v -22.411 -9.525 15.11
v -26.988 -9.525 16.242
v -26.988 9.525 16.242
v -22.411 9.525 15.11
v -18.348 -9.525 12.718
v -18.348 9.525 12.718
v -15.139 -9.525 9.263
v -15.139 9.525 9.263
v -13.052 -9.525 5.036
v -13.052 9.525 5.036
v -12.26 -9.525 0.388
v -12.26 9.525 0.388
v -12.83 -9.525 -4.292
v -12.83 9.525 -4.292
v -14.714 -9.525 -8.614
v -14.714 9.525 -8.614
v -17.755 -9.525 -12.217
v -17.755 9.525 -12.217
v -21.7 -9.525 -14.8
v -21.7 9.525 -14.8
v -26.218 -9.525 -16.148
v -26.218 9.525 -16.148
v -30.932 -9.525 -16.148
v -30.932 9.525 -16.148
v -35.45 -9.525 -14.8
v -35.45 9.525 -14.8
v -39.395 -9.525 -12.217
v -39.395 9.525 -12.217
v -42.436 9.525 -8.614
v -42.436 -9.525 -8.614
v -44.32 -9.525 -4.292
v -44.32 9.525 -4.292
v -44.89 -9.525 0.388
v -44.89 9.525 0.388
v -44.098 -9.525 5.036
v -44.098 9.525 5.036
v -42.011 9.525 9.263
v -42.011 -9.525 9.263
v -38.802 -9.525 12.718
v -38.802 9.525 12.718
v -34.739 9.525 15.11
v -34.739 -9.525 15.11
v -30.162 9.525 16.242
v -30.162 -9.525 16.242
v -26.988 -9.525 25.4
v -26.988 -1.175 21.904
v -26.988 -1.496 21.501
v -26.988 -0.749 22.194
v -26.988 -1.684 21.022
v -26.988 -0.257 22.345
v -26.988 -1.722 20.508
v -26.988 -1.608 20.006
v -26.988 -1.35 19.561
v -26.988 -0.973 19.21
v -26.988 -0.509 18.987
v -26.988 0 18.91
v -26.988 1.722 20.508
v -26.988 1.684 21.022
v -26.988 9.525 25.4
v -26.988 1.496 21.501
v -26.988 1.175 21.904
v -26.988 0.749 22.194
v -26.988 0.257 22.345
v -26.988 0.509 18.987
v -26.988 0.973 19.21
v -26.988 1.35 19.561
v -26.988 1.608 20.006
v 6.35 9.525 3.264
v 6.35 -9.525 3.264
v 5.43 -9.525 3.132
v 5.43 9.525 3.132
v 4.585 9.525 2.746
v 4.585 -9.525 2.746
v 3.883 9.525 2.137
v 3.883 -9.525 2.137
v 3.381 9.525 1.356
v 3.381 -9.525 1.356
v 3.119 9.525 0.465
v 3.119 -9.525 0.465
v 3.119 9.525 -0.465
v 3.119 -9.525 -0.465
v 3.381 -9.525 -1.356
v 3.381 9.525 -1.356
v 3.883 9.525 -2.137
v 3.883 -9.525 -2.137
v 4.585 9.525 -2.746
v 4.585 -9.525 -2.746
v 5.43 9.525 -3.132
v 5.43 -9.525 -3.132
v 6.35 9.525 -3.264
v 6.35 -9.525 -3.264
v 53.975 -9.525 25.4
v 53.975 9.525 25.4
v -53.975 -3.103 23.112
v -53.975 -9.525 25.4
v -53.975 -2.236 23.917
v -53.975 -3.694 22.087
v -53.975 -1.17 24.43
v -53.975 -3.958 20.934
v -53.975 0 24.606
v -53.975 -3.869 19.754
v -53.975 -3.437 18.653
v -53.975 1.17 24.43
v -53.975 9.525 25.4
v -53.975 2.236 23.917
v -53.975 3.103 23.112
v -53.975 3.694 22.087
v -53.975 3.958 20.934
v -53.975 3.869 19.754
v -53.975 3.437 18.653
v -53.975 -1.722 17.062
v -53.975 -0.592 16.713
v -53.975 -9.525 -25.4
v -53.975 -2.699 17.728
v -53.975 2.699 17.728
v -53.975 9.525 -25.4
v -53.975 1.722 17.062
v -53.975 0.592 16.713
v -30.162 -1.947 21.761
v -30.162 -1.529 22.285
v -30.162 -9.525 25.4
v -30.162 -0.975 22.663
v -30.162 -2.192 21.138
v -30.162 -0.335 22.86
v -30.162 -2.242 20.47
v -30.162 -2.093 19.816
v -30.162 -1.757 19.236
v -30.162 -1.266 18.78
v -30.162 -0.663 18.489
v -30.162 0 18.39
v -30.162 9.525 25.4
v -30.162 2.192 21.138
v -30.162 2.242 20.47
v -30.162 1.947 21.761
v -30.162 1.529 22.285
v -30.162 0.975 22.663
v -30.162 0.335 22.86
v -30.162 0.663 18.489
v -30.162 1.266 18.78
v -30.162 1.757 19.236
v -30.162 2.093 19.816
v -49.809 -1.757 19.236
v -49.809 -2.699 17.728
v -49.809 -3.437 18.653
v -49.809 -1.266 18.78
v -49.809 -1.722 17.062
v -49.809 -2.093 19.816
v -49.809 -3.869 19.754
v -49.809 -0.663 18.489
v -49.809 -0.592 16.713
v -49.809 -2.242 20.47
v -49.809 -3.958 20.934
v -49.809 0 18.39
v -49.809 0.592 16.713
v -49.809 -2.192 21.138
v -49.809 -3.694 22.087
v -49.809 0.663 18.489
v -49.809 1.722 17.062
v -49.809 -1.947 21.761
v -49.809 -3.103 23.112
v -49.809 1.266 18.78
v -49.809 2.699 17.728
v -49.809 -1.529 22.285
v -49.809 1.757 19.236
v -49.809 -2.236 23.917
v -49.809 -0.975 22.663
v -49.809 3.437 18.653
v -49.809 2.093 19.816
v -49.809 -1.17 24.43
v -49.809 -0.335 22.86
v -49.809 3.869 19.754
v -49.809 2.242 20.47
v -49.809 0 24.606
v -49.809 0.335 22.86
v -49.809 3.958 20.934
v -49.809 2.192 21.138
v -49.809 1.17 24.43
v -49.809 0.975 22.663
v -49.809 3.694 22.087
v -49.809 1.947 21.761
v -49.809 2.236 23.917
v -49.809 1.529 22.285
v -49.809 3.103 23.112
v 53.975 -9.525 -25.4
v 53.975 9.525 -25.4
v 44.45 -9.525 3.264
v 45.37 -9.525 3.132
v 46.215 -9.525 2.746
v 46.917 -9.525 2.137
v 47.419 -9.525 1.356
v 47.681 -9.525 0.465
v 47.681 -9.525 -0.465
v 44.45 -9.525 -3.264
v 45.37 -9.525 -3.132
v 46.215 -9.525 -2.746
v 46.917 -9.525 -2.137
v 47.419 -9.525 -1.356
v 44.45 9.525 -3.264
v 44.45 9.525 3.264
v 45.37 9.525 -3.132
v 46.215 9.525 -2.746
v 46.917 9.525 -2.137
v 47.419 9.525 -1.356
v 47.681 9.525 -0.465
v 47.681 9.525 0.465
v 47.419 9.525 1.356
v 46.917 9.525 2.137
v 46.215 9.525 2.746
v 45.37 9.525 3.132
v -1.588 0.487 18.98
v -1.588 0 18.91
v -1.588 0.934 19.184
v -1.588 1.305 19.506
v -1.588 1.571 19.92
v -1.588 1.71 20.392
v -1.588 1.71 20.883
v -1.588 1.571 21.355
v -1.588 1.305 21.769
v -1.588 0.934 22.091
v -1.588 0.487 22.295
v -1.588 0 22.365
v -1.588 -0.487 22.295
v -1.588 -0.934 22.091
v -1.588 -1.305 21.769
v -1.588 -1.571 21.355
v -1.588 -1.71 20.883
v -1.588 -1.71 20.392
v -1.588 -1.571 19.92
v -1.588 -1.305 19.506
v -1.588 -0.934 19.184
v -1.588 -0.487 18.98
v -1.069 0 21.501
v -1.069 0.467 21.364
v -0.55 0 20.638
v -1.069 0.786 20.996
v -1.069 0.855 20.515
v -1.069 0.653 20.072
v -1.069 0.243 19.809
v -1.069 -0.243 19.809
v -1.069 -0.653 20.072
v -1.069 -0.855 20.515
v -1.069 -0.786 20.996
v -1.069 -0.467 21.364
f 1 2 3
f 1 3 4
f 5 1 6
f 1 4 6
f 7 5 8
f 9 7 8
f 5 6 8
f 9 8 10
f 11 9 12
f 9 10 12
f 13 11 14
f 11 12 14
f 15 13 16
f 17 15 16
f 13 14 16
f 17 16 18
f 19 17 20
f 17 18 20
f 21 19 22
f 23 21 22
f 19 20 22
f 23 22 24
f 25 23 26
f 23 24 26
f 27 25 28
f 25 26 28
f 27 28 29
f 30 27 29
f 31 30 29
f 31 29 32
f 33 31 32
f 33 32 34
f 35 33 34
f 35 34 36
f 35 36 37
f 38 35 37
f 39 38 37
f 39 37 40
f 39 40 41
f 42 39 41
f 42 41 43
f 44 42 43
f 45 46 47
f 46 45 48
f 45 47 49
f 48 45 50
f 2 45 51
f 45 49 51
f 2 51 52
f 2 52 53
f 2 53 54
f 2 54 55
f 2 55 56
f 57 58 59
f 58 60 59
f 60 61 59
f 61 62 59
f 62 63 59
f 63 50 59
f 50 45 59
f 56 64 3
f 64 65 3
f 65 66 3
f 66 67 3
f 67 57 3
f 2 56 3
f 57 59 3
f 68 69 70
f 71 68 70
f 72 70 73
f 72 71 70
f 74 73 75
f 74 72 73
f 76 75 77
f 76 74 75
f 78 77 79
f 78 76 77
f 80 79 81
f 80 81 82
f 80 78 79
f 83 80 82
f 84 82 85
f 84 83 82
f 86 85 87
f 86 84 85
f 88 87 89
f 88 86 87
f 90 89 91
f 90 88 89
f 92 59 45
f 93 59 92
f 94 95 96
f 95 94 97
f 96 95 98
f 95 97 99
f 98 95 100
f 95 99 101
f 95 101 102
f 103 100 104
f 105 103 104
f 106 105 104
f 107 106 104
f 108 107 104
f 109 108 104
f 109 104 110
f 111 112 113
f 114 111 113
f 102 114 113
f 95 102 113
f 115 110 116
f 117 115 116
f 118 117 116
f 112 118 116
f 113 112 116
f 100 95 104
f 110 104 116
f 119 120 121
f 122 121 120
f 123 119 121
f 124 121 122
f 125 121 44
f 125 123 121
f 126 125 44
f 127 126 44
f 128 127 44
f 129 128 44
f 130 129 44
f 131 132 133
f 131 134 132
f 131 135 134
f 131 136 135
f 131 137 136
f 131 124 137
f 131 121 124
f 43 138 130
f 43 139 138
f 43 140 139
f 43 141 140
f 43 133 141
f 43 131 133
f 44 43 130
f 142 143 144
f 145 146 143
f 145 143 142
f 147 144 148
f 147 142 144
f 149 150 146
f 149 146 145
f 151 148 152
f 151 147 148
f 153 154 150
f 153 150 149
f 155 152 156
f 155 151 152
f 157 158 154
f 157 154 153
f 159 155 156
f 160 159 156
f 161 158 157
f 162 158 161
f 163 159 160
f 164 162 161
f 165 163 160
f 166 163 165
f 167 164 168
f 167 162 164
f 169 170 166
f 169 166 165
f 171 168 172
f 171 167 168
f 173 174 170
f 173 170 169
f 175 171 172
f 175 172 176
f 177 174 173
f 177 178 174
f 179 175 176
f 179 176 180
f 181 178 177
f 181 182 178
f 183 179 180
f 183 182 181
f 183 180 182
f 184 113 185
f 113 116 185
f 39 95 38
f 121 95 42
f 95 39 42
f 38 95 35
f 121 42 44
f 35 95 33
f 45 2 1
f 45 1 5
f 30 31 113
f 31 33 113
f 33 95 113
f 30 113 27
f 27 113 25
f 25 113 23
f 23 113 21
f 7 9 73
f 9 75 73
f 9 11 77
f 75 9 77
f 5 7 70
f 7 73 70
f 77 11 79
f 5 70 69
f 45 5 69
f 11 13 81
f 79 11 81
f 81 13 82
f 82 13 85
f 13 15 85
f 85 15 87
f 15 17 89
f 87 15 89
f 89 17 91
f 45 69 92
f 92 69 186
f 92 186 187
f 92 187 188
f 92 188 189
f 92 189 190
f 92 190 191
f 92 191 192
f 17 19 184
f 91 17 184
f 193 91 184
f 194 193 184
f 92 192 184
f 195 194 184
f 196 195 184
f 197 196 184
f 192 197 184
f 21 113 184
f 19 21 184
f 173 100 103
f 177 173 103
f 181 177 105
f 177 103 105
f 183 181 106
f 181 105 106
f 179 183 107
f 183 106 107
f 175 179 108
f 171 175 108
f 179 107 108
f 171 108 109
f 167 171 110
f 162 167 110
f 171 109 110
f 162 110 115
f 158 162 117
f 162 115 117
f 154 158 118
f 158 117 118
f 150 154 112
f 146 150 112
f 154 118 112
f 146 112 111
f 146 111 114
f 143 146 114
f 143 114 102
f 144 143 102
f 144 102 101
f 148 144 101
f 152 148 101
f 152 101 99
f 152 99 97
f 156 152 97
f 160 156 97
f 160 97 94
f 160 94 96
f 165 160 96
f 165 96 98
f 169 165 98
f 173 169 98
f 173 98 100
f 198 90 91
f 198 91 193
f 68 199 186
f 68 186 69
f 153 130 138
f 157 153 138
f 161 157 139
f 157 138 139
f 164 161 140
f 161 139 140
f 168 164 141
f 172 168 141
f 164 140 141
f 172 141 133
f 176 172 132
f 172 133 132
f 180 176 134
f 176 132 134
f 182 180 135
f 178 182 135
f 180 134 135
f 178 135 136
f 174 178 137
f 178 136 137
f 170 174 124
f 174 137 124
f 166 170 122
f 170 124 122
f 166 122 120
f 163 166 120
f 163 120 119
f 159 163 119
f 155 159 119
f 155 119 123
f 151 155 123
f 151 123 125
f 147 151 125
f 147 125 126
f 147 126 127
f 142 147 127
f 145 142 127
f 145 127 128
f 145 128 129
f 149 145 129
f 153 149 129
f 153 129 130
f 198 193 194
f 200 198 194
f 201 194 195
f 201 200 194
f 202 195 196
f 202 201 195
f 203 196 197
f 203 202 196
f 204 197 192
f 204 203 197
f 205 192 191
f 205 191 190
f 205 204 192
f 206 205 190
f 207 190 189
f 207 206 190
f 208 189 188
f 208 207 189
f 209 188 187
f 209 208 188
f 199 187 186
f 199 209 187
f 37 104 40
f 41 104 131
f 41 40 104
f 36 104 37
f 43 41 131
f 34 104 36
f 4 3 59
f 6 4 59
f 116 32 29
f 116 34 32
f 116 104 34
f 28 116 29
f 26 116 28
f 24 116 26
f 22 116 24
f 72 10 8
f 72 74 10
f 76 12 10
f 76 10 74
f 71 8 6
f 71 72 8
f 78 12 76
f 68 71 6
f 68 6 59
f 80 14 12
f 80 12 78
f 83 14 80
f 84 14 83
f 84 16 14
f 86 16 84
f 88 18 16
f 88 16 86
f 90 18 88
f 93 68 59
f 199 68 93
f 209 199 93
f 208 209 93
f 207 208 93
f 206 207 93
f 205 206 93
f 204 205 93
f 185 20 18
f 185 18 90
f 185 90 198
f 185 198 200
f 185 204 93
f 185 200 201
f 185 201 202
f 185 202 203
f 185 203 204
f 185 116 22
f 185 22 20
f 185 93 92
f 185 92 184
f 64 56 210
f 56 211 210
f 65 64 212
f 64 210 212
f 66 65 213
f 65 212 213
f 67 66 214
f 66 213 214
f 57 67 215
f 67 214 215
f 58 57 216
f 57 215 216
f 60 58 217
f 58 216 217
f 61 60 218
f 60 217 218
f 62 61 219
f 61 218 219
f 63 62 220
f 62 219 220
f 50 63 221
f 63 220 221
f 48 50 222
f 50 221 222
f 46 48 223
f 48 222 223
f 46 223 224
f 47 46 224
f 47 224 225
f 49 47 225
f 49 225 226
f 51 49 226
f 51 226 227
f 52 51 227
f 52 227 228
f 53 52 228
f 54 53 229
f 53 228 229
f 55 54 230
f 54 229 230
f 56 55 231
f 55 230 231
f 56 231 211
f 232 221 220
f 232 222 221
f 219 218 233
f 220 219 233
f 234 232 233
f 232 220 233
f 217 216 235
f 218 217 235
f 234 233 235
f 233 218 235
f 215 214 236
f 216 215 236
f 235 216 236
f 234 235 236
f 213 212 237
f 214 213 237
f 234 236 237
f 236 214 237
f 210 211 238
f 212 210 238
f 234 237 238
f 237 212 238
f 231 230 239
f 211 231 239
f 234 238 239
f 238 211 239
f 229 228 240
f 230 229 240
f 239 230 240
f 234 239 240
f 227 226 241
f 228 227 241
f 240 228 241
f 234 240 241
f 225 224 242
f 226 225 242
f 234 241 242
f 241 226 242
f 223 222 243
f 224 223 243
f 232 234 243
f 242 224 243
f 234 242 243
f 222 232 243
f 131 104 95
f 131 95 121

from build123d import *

# Parameters (mm, degrees)
SKETCH1_W                                      = 107.95
SKETCH1_H                                      = 50.8
BOSS_EXTRUDE1_DEPTH                            = 9.525
SKETCH2_R                                      = 16.3195
CUT_EXTRUDE1_DEPTH                             = 19.05
SKETCH3_W                                      = 3.175
SKETCH3_H                                      = 25.4
CUT_EXTRUDE2_DEPTH                             = 19.05
CBORE_FOR_8_SOCKET_HEAD_CAP_SCREW1_D           = 4.4958
CBORE_FOR_8_SOCKET_HEAD_CAP_SCREW1_DEPTH       = 23.8125
CBORE_FOR_8_SOCKET_HEAD_CAP_SCREW1_CBORE_D     = 7.9375
CBORE_FOR_8_SOCKET_HEAD_CAP_SCREW1_CBORE_DEPTH = 4.1656
F_8_32_TAPPED_HOLE1_D                          = 3.4544
F_8_32_TAPPED_HOLE1_DEPTH                      = 25.4
F_8_32_TAPPED_HOLE1_TIP                        = 1.037806461
CUT_EXTRUDE3_DEPTH                             = 19.05


with BuildPart() as part:
    # Sketch1 → Boss-Extrude1 (new, symmetric)
    with BuildSketch(Plane(origin=(0, 0, 0), x_dir=(1, 0, 0), z_dir=(0, 1, 0))):
        Rectangle(SKETCH1_W, SKETCH1_H)
    extrude(amount=BOSS_EXTRUDE1_DEPTH, both=True)

    # Sketch2 → Cut-Extrude1 (cut)
    with BuildSketch(Plane(origin=(0, 9.525, 0), x_dir=(1, 0, 0), z_dir=(0, 1, 0))):
        with Locations(Location((-28.575, 0, 0), (0, 0, 270))):
            Circle(SKETCH2_R)
    extrude(amount=-CUT_EXTRUDE1_DEPTH, mode=Mode.SUBTRACT)

    # Sketch3 → Cut-Extrude2 (cut)
    with BuildSketch(Plane(origin=(0, 9.525, 0), x_dir=(1, 0, 0), z_dir=(0, 1, 0))):
        with Locations((-28.575, -12.7)):
            Rectangle(SKETCH3_W, SKETCH3_H)
    extrude(amount=-CUT_EXTRUDE2_DEPTH, mode=Mode.SUBTRACT)

    # CBORE for #8 Socket Head Cap Screw1
    with Locations(Plane.ZY.offset(53.975)):
        with Locations((20.6375, 0)):
            CounterBoreHole(CBORE_FOR_8_SOCKET_HEAD_CAP_SCREW1_D / 2, CBORE_FOR_8_SOCKET_HEAD_CAP_SCREW1_CBORE_D / 2, CBORE_FOR_8_SOCKET_HEAD_CAP_SCREW1_CBORE_DEPTH, depth=CBORE_FOR_8_SOCKET_HEAD_CAP_SCREW1_DEPTH)

    # #8-32 Tapped Hole1
    with Locations(Plane.ZY.offset(26.9875)):
        with Locations((20.6375, 0)):
            Hole(F_8_32_TAPPED_HOLE1_D / 2, depth=F_8_32_TAPPED_HOLE1_DEPTH)
            with Locations((0, 0, -(F_8_32_TAPPED_HOLE1_DEPTH + F_8_32_TAPPED_HOLE1_TIP / 2))):  # 118° drill point
                Cone(0, F_8_32_TAPPED_HOLE1_D / 2, F_8_32_TAPPED_HOLE1_TIP, mode=Mode.SUBTRACT)

    # Sketch12 → Cut-Extrude3 (cut)
    with BuildSketch(Plane(origin=(0, 9.525, 0), x_dir=(1, 0, 0), z_dir=(0, 1, 0))):
        with BuildLine():
            Line((6.35, 3.2639), (44.45, 3.2639))
            ThreePointArc((44.45, 3.2639), (47.7139, 0), (44.45, -3.2639))
            Line((44.45, -3.2639), (6.35, -3.2639))
            ThreePointArc((6.35, -3.2639), (3.0861, 0), (6.35, 3.2639))
        make_face()
    extrude(amount=-CUT_EXTRUDE3_DEPTH, mode=Mode.SUBTRACT)


solid = part.part
